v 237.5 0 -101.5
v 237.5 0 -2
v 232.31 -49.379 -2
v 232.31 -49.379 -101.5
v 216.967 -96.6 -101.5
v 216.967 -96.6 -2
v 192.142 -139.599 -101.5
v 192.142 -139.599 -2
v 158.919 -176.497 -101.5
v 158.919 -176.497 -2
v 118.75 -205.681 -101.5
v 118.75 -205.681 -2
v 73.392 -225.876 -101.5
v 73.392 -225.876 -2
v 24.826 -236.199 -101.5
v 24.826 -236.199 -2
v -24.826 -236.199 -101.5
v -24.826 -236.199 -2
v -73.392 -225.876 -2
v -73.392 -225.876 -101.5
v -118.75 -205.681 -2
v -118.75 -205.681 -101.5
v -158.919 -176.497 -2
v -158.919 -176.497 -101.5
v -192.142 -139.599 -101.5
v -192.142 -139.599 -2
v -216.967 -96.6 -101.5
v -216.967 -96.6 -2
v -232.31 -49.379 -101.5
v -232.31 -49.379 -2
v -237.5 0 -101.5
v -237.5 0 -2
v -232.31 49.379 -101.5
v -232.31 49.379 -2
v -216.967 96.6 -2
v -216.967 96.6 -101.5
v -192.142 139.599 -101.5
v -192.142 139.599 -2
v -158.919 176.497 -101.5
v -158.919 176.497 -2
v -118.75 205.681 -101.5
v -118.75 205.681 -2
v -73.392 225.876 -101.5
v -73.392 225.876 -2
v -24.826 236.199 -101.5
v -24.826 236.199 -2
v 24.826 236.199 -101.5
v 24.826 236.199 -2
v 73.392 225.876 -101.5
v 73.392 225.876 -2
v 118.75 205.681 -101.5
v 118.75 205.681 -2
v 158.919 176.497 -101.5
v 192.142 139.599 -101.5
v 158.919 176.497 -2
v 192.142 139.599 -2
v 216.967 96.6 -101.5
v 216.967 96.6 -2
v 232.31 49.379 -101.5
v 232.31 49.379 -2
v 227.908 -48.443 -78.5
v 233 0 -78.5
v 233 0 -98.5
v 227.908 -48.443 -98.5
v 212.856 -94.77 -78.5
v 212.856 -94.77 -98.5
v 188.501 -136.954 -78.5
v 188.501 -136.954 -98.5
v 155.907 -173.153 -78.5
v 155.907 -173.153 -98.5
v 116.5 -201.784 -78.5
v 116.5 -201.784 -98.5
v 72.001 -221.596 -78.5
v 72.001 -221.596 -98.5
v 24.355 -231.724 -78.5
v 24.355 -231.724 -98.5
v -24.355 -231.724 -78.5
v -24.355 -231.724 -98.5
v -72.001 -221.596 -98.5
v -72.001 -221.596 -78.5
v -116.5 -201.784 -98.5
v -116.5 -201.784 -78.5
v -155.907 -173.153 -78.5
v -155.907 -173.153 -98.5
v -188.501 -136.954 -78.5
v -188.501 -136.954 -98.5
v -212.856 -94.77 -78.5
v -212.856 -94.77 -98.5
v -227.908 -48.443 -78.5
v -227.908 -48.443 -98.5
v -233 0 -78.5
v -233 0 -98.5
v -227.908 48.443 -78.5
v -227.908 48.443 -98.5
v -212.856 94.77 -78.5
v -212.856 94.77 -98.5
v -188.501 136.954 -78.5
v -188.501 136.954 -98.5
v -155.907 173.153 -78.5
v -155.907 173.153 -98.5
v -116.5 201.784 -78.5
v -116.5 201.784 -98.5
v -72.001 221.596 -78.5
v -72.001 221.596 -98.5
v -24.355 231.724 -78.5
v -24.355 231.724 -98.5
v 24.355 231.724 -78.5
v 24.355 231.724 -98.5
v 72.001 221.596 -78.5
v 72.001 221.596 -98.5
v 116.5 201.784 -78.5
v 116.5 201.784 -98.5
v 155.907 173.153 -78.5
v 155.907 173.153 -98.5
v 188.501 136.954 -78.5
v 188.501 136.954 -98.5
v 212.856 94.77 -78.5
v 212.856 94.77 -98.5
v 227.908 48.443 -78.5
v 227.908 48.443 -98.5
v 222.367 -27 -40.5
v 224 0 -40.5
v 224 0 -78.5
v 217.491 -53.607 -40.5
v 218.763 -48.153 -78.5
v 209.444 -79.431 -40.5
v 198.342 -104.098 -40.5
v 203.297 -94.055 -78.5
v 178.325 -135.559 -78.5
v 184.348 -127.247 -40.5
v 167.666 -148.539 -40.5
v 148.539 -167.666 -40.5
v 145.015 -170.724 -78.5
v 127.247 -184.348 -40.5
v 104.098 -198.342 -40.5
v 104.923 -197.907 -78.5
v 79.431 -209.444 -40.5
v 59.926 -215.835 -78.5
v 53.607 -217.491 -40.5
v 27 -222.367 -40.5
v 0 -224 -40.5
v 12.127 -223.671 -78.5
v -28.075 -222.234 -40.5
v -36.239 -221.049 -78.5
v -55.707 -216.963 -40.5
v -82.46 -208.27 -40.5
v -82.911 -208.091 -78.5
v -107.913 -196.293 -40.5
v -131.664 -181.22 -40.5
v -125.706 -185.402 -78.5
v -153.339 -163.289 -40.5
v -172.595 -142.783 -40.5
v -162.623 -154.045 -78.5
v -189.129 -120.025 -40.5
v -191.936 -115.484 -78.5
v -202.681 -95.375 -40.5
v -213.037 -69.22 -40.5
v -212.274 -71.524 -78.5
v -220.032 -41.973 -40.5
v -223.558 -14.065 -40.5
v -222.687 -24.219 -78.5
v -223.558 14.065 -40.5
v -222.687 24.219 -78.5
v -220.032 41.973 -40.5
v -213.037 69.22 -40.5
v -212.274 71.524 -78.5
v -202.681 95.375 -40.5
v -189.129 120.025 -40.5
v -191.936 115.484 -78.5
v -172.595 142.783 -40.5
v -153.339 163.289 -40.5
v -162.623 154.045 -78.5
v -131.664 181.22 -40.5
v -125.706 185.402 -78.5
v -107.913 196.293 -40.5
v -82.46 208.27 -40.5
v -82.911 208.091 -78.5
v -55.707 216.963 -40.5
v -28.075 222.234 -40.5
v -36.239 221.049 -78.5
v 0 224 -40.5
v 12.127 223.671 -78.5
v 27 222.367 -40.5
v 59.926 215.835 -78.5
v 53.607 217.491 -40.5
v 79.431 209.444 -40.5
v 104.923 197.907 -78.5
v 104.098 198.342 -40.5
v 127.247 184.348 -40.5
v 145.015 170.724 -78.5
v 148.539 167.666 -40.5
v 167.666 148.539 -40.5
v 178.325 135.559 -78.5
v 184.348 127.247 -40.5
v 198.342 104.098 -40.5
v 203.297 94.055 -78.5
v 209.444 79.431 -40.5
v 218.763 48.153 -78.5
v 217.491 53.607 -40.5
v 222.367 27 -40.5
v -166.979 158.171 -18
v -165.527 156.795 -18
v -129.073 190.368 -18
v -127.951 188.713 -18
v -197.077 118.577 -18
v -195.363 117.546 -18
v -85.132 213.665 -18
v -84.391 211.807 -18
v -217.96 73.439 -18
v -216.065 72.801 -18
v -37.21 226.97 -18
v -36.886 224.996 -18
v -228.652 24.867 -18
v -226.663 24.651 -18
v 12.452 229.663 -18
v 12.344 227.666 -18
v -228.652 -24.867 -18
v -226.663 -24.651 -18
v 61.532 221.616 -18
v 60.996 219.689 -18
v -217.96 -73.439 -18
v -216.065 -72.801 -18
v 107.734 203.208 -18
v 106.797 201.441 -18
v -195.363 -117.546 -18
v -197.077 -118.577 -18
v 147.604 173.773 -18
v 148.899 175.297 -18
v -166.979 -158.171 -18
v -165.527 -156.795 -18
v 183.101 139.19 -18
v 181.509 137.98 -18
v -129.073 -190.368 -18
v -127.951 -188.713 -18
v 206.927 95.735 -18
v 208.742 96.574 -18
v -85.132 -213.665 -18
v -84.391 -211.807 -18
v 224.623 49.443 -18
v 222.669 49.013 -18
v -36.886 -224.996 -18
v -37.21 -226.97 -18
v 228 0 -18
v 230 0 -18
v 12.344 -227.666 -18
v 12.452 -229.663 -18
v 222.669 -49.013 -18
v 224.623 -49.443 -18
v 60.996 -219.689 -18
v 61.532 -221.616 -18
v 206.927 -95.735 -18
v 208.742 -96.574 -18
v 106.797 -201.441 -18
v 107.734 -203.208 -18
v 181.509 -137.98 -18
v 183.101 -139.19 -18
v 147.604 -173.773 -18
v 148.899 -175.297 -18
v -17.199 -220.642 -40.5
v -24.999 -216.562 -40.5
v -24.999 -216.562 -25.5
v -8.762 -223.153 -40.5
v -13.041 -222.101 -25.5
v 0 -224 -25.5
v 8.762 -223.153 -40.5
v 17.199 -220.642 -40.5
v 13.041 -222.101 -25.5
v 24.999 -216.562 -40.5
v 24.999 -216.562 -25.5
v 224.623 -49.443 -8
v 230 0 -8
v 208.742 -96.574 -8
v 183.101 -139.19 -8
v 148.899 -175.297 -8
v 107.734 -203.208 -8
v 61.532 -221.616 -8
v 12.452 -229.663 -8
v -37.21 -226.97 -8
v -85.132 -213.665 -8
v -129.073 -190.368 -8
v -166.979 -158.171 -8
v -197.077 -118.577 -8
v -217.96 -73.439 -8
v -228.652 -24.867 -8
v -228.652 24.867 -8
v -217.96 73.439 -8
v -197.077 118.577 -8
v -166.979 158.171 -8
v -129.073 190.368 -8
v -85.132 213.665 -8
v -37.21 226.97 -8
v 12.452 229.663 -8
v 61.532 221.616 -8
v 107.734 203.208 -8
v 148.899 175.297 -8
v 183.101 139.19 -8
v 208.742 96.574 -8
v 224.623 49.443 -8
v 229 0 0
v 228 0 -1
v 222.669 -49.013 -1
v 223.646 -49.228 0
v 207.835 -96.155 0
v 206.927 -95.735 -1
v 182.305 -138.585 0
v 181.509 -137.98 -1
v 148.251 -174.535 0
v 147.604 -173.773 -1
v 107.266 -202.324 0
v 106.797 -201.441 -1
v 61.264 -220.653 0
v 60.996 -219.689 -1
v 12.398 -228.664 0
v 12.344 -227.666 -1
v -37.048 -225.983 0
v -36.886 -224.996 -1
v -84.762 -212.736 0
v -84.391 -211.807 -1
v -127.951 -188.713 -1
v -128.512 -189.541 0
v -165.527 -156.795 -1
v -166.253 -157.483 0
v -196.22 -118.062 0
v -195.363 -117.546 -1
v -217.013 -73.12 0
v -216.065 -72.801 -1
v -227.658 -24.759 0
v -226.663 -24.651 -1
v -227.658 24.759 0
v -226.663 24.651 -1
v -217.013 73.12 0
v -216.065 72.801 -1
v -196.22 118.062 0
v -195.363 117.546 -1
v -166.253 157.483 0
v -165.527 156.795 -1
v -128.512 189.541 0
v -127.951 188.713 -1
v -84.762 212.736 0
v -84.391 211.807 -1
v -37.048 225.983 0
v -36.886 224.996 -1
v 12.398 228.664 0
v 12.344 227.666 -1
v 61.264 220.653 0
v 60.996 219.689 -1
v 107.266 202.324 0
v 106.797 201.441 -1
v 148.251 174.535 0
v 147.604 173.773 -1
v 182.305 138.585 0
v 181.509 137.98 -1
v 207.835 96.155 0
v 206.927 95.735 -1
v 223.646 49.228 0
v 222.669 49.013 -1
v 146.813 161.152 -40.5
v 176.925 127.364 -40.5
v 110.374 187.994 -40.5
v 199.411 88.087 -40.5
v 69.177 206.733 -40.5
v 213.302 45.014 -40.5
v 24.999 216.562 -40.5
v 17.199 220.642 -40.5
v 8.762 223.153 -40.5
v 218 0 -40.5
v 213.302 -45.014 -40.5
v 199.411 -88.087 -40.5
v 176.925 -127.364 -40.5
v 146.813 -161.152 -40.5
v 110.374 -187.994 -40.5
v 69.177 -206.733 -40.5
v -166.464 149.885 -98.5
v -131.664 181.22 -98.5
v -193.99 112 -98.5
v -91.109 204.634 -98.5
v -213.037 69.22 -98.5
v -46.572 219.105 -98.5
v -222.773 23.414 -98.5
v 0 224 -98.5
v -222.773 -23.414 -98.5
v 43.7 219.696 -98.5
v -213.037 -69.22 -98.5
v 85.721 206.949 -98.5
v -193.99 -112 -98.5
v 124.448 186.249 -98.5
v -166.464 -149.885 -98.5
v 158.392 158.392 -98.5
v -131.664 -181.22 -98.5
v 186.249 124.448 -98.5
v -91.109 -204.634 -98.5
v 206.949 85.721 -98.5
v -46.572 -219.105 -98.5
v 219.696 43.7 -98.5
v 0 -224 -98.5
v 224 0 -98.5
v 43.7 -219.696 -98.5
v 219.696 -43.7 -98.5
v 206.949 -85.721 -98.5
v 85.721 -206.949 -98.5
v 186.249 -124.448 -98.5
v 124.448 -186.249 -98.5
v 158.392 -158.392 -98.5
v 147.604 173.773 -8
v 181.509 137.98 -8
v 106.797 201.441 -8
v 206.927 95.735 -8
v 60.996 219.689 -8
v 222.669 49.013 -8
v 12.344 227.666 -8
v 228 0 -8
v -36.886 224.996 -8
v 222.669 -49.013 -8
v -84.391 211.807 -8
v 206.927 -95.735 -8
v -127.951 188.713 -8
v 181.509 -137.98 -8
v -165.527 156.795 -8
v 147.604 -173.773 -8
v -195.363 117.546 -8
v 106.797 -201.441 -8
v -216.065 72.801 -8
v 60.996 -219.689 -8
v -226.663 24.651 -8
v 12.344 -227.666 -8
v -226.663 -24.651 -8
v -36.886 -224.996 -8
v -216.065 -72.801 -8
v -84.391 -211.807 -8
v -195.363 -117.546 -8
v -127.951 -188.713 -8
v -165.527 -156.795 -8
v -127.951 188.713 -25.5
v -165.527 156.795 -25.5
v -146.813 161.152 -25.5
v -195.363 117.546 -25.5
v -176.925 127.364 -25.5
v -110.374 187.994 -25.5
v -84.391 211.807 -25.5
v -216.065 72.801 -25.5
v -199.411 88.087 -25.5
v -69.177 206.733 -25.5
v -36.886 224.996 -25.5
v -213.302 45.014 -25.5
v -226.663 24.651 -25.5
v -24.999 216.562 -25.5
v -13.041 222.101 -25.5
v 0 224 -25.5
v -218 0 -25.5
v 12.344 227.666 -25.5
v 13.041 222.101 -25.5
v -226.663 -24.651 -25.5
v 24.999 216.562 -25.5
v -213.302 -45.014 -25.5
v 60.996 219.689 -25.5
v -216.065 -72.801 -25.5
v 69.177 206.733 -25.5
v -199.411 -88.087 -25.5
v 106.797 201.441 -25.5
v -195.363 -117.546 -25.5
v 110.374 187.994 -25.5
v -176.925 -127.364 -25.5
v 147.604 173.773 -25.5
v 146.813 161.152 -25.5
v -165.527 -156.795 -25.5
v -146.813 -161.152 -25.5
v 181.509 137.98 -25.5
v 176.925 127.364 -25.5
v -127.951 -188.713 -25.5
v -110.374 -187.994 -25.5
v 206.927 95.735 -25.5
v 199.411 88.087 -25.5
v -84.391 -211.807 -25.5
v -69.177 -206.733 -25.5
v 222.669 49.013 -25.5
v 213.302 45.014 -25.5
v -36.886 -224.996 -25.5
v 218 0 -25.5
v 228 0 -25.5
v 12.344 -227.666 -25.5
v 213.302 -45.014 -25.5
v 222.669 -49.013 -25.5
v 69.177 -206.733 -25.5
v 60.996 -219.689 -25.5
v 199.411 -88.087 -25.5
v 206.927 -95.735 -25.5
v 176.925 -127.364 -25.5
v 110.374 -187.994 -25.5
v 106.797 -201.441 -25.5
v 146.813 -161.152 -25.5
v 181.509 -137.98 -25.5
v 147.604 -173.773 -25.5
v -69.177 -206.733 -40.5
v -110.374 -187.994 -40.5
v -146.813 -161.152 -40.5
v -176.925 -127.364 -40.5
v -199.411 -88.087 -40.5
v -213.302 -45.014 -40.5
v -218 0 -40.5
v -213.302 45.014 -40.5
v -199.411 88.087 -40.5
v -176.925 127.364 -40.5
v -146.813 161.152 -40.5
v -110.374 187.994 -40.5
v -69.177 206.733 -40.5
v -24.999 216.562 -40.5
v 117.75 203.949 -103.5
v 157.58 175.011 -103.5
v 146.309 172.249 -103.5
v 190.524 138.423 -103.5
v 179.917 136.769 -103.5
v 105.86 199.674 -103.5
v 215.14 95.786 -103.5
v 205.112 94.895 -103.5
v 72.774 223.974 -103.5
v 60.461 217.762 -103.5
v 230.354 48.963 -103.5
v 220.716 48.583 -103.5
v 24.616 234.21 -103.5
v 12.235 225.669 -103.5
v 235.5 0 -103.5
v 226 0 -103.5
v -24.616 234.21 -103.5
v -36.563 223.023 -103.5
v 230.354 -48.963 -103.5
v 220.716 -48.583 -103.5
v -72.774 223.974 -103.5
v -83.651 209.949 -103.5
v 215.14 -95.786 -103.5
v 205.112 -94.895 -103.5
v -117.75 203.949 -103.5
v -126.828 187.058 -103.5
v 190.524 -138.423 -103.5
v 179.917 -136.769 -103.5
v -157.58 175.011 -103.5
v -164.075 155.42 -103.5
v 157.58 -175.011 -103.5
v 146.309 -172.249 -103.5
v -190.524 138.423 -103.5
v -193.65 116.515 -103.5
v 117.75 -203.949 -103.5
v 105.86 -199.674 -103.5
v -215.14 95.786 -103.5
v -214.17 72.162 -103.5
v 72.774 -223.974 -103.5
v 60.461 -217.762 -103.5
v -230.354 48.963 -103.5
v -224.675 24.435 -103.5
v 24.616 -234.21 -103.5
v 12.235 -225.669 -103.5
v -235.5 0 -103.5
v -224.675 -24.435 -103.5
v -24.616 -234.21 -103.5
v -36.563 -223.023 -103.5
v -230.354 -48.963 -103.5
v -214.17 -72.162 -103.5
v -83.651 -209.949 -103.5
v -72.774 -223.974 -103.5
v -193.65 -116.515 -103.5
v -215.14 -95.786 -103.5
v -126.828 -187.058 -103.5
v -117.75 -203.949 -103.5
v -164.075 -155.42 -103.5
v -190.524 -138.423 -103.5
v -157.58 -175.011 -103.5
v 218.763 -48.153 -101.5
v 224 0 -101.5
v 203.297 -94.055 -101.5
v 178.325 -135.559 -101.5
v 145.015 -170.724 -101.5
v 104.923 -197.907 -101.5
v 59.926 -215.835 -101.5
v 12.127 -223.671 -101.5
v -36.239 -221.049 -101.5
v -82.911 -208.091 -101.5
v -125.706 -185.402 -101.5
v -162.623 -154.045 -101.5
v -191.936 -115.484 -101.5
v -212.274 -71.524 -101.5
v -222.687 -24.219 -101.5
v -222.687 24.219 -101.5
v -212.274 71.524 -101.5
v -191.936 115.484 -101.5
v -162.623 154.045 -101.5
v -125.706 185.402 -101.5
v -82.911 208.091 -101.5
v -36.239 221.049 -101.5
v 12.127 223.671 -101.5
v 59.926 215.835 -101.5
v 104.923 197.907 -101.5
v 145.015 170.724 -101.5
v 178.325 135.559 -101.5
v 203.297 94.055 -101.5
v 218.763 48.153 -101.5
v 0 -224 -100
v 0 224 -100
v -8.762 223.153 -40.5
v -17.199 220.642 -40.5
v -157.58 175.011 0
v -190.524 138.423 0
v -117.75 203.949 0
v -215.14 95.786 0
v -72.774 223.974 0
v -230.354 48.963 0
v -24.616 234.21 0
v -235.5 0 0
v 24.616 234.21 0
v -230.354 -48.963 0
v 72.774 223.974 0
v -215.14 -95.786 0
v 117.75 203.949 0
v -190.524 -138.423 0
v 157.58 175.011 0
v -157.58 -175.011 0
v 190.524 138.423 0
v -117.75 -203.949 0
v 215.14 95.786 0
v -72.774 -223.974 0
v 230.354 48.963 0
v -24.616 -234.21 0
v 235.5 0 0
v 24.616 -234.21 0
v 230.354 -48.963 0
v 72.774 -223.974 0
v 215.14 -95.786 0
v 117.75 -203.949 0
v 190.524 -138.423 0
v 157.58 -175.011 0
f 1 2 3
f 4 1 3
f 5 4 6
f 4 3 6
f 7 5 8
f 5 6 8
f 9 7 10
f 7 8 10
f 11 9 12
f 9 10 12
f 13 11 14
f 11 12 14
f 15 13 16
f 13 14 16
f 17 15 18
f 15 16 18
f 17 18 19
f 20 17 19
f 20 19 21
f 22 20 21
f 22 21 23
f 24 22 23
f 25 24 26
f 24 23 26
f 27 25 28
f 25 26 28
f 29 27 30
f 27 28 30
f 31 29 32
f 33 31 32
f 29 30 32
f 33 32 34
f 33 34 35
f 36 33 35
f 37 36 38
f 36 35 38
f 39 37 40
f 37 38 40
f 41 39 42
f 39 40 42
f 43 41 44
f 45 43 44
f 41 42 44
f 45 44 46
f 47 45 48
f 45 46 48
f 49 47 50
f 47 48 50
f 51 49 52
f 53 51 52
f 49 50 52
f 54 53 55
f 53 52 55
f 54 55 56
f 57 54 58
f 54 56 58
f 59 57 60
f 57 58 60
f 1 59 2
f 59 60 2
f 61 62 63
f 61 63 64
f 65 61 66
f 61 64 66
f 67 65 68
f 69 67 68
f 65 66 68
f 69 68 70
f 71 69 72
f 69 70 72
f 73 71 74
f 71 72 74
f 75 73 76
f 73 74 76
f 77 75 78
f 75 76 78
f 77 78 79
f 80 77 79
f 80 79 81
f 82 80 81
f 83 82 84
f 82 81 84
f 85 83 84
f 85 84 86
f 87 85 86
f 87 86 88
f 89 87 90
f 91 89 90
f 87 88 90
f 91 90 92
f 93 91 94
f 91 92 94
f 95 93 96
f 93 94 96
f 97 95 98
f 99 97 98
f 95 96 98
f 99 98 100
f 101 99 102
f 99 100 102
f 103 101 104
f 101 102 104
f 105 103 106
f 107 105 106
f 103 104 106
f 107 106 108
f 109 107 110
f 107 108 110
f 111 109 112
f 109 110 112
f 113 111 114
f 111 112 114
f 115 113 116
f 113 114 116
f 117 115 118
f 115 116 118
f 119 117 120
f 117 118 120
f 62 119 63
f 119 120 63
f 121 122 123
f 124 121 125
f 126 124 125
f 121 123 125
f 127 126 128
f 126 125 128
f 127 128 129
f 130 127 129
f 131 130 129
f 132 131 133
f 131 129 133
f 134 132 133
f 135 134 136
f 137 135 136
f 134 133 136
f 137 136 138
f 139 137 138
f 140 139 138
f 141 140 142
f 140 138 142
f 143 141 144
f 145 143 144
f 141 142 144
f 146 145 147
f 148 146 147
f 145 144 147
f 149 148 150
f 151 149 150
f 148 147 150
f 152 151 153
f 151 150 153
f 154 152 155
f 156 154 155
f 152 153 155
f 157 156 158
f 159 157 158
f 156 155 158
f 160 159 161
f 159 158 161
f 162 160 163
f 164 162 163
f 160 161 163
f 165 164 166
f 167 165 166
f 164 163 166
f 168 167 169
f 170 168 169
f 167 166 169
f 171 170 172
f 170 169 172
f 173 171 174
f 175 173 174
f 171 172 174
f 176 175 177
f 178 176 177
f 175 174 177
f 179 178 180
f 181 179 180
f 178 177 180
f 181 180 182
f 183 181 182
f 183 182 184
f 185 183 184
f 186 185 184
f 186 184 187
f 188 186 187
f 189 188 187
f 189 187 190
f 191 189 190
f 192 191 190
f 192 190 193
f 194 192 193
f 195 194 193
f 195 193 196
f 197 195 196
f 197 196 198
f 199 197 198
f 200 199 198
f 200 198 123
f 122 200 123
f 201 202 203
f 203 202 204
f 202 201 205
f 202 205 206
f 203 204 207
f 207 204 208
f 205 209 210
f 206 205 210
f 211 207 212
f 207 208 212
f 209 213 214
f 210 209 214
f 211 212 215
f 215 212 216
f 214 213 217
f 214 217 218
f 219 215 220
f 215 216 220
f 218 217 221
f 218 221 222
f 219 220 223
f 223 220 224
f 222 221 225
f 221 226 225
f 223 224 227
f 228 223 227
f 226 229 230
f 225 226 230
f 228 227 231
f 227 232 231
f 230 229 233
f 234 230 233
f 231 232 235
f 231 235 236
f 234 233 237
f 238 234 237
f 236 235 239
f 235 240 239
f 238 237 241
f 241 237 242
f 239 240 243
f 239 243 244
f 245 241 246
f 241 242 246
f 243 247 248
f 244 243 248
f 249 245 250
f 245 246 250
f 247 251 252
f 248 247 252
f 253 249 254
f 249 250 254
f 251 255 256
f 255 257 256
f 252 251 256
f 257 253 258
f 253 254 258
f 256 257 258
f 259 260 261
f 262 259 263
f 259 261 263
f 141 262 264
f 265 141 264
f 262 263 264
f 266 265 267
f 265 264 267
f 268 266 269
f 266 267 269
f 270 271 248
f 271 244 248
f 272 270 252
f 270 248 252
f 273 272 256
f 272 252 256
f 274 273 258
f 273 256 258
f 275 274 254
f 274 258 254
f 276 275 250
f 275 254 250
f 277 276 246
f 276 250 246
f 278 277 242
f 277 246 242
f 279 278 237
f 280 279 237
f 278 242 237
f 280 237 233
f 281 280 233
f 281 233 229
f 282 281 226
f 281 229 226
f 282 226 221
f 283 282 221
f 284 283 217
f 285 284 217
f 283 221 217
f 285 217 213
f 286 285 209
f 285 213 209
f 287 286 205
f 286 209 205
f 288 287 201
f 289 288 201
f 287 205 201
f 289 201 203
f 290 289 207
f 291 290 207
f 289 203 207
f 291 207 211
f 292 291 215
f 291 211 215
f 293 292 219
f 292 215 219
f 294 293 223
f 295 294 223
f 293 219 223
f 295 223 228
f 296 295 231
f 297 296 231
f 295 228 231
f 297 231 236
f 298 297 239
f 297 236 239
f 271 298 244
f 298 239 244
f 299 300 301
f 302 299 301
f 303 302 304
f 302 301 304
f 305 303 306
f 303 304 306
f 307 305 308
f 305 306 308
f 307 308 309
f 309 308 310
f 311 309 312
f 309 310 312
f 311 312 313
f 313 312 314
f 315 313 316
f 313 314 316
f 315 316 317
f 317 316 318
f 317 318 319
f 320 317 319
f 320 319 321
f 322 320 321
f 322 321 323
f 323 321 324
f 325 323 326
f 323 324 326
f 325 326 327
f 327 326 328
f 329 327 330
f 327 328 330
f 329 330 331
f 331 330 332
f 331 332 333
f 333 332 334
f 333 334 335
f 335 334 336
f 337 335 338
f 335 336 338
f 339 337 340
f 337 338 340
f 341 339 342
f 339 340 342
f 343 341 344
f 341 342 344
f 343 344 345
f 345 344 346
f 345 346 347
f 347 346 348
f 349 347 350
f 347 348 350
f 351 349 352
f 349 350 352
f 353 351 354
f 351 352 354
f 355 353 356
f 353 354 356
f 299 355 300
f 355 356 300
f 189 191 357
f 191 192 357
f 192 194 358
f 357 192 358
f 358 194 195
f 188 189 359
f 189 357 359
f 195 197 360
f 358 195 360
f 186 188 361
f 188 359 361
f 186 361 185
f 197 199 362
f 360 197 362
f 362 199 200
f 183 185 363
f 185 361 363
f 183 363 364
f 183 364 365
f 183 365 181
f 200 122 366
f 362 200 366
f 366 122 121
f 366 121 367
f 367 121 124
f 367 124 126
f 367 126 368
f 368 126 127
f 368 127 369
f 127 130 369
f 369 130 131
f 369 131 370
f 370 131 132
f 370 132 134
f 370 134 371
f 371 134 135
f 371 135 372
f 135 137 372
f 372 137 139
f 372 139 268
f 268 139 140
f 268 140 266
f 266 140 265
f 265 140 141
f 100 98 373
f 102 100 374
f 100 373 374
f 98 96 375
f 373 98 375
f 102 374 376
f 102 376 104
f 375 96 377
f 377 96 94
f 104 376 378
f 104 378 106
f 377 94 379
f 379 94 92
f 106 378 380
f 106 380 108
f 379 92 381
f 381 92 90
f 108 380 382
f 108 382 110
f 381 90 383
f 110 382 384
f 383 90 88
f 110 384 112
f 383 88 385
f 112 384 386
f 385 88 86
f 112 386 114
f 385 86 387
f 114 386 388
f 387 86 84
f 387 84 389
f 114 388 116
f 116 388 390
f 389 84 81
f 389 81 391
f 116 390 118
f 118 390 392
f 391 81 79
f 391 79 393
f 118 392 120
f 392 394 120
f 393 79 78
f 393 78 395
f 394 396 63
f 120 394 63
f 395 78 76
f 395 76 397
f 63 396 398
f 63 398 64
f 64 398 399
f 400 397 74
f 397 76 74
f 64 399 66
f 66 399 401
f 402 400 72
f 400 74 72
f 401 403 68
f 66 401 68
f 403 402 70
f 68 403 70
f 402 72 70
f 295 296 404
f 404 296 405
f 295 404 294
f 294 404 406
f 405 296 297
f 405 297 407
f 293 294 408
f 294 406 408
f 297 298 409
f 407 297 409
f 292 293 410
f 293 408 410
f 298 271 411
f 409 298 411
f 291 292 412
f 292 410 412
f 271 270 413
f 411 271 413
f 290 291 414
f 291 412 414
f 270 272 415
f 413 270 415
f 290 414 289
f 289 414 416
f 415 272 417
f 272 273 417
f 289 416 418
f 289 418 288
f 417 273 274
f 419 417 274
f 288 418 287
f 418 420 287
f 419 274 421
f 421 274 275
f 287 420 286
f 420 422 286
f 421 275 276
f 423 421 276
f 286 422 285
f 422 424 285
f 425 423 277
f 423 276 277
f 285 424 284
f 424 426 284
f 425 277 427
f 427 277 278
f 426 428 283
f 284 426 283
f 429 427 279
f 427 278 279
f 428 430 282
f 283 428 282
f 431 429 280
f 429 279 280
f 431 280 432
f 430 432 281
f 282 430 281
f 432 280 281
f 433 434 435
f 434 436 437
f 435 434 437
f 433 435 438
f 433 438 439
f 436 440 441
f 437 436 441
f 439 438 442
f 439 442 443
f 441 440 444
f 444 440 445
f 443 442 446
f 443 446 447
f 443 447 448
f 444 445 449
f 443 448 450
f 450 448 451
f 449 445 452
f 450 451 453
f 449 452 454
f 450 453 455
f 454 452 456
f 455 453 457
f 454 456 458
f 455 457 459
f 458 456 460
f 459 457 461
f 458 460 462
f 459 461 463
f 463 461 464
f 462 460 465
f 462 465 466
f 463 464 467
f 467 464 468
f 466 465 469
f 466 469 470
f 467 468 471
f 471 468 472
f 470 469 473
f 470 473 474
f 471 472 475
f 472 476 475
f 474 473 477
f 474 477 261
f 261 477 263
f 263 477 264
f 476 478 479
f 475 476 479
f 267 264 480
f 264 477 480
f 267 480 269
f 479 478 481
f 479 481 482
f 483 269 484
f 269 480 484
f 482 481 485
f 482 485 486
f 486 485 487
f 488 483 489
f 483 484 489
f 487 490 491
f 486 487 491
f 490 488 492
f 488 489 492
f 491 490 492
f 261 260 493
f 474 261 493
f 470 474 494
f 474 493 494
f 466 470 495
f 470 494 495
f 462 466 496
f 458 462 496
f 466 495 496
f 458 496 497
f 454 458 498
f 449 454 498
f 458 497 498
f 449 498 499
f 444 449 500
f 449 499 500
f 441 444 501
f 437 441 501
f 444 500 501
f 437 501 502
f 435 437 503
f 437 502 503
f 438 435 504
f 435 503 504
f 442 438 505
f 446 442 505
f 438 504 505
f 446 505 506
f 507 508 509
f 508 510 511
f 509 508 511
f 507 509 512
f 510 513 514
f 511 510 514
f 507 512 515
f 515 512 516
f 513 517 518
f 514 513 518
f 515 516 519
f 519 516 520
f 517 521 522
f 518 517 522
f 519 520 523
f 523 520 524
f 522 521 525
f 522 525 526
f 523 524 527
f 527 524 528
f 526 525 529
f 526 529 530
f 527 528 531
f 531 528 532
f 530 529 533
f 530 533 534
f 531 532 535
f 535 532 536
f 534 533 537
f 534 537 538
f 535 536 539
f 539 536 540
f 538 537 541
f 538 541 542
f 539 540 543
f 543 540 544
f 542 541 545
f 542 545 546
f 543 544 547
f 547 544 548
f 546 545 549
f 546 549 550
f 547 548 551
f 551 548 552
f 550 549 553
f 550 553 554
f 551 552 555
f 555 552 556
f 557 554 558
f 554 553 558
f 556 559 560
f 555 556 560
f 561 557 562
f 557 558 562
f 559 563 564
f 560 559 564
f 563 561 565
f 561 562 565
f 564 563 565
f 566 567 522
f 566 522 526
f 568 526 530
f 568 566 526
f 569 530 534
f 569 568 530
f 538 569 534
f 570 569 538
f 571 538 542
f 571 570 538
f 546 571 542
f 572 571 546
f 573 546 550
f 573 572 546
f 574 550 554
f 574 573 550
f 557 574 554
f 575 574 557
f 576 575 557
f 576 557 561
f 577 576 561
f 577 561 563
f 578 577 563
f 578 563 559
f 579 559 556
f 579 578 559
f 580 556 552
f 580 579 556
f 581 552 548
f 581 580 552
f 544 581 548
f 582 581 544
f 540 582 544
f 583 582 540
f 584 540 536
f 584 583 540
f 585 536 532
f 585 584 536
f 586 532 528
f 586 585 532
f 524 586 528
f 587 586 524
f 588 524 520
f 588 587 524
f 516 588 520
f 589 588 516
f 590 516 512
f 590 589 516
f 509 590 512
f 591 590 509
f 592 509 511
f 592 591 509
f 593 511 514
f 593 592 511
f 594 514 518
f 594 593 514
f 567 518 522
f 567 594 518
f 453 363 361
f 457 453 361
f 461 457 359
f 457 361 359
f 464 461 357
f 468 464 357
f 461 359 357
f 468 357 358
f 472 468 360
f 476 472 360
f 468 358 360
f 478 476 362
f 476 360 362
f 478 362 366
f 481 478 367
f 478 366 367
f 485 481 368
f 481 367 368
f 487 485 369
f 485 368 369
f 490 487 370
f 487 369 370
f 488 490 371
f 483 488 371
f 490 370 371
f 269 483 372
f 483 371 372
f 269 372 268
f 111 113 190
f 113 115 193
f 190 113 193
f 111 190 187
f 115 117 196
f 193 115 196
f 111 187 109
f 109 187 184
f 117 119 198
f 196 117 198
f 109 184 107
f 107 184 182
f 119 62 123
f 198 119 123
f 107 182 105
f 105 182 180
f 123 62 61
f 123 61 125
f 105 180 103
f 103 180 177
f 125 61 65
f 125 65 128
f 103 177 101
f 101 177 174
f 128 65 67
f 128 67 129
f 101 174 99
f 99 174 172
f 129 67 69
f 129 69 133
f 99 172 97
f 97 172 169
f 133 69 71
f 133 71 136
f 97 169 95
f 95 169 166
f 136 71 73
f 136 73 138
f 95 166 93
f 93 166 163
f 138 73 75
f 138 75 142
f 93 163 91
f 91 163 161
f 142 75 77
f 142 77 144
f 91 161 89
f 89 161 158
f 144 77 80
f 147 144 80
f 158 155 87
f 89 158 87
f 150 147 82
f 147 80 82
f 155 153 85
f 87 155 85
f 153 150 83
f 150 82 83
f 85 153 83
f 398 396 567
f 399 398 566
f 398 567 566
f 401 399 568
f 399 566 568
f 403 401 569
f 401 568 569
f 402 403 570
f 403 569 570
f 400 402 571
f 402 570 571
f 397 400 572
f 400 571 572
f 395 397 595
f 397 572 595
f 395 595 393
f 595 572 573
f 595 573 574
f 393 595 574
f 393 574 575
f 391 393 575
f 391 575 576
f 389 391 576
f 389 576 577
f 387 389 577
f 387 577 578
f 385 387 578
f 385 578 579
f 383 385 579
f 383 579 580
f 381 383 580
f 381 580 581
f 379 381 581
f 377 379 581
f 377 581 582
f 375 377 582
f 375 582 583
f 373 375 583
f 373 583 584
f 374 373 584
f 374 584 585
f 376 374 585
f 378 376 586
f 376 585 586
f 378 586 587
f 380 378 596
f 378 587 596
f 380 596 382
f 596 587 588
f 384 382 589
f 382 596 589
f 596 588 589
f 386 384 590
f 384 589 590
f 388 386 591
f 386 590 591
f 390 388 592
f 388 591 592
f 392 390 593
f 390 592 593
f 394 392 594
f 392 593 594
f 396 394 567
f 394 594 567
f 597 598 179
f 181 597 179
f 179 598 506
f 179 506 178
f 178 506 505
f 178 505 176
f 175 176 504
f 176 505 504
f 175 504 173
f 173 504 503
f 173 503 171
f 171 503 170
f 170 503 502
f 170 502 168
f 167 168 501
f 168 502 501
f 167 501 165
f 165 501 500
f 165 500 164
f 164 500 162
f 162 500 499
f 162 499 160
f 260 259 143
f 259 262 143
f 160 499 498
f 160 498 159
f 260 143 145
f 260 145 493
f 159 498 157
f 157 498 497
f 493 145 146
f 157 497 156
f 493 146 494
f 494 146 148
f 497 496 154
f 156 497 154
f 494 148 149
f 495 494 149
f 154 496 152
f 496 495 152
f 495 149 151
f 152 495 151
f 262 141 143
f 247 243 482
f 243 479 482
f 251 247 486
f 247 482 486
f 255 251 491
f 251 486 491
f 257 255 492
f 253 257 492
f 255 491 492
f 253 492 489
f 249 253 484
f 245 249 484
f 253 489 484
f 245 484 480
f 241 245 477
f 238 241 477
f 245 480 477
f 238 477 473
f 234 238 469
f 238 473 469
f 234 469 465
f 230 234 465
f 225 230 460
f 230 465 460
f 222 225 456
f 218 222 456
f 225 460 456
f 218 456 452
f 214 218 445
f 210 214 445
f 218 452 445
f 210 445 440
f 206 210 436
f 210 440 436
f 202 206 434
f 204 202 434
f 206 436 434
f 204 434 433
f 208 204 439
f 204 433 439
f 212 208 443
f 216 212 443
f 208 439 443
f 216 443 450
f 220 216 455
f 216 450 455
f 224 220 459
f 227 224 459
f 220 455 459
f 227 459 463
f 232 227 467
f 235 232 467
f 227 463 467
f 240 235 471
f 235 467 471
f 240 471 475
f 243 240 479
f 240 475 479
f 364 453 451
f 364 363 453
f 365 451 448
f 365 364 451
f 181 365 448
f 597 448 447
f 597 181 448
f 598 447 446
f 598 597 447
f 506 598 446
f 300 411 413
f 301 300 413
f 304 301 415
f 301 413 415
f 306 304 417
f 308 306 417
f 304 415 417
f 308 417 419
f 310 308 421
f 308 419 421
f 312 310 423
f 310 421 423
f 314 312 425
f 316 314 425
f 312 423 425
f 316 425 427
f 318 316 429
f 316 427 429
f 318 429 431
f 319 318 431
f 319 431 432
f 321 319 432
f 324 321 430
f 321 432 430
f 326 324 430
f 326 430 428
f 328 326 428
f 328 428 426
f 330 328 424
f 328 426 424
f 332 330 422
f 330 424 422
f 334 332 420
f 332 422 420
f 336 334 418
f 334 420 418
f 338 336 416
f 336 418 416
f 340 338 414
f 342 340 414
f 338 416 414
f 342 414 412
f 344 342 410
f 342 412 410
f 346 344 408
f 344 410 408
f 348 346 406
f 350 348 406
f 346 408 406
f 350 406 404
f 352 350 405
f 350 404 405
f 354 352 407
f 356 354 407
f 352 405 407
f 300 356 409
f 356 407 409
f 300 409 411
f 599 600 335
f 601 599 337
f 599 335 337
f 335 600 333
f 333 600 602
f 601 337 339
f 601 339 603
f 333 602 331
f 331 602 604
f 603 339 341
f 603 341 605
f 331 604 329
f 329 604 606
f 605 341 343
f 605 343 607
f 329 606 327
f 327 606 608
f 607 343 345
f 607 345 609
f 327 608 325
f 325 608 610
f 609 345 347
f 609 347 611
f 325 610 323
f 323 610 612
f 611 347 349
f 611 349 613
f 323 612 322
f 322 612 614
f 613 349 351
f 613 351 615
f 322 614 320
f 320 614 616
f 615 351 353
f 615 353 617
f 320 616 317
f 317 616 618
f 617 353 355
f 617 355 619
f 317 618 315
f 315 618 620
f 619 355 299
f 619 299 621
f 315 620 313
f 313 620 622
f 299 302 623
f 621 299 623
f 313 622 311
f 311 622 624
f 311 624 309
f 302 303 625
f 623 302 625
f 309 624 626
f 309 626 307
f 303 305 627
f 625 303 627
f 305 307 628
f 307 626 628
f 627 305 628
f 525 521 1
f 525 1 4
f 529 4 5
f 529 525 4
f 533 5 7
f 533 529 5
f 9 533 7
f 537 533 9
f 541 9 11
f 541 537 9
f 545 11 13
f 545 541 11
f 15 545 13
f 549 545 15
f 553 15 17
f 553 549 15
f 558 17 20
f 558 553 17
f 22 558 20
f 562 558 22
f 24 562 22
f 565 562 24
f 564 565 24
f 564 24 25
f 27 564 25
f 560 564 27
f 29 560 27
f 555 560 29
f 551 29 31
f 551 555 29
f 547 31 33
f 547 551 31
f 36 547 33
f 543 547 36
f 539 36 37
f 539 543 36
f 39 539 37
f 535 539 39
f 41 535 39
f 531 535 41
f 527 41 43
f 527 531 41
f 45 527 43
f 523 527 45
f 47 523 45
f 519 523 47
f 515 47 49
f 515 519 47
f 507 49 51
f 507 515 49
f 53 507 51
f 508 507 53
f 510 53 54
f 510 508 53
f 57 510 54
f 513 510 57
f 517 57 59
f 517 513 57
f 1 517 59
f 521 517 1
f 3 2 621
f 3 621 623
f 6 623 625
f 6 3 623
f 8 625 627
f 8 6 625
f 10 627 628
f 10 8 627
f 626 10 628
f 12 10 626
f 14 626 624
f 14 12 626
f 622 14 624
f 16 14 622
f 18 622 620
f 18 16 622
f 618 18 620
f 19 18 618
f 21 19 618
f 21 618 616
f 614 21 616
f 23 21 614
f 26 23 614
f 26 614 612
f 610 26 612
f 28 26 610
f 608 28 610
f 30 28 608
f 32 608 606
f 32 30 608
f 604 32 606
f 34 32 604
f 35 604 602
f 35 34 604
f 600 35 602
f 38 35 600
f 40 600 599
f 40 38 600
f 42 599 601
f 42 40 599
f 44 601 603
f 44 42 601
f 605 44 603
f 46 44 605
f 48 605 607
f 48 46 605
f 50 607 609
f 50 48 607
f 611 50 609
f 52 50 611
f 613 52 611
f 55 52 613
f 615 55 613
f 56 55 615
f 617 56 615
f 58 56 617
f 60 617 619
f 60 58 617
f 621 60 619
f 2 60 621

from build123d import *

# Parameters (mm, degrees)
F2_SIZE  = 1
F3_SIZE  = 2
F5_DEPTH = 100


with BuildPart() as f1:
    # F0 (on Front) → F1 (revolve)
    with BuildSketch(Plane.XZ):
        Polygon((237.5, -103.5), (237.5, 0), (228, 0), (228, -8), (230, -8), (230, -18), (228, -18), (228, -25.5), (218, -25.5), (218, -40.5), (224, -40.5), (224, -78.5), (233, -78.5), (233, -98.5), (224, -98.5), (224, -103.5), align=None)
    revolve(axis=Axis((0, 0, -40.326346), (0, 0, -1)))

    # F2
    f2_edges = [f1.edges().sort_by_distance(p)[0] for p in [
        (-228, 0, 0),
    ]]
    chamfer(f2_edges, length=F2_SIZE)

    # F3
    f3_edges = [f1.edges().sort_by_distance(p)[0] for p in [
        (-237.5, 0, 0),
        (-224, 0, -103.5),
        (-237.5, 0, -103.5),
    ]]
    chamfer(f3_edges, length=F3_SIZE)

    # F4 (on Top) → F5 (cut, symmetric)
    with BuildSketch(Plane.XY):
        with BuildLine():
            ThreePointArc((-24.999351, 216.561844), (0, 218), (24.999351, 216.561844))
            ThreePointArc((24.999351, 216.561844), (0, 224), (-24.999351, 216.561844))
        make_face()
        with BuildLine():
            ThreePointArc((-24.999351, -216.561844), (0, -224), (24.999351, -216.561844))
            ThreePointArc((24.999351, -216.561844), (0, -218), (-24.999351, -216.561844))
        make_face()
    extrude(amount=F5_DEPTH, both=True, mode=Mode.SUBTRACT)


solid = f1.part
